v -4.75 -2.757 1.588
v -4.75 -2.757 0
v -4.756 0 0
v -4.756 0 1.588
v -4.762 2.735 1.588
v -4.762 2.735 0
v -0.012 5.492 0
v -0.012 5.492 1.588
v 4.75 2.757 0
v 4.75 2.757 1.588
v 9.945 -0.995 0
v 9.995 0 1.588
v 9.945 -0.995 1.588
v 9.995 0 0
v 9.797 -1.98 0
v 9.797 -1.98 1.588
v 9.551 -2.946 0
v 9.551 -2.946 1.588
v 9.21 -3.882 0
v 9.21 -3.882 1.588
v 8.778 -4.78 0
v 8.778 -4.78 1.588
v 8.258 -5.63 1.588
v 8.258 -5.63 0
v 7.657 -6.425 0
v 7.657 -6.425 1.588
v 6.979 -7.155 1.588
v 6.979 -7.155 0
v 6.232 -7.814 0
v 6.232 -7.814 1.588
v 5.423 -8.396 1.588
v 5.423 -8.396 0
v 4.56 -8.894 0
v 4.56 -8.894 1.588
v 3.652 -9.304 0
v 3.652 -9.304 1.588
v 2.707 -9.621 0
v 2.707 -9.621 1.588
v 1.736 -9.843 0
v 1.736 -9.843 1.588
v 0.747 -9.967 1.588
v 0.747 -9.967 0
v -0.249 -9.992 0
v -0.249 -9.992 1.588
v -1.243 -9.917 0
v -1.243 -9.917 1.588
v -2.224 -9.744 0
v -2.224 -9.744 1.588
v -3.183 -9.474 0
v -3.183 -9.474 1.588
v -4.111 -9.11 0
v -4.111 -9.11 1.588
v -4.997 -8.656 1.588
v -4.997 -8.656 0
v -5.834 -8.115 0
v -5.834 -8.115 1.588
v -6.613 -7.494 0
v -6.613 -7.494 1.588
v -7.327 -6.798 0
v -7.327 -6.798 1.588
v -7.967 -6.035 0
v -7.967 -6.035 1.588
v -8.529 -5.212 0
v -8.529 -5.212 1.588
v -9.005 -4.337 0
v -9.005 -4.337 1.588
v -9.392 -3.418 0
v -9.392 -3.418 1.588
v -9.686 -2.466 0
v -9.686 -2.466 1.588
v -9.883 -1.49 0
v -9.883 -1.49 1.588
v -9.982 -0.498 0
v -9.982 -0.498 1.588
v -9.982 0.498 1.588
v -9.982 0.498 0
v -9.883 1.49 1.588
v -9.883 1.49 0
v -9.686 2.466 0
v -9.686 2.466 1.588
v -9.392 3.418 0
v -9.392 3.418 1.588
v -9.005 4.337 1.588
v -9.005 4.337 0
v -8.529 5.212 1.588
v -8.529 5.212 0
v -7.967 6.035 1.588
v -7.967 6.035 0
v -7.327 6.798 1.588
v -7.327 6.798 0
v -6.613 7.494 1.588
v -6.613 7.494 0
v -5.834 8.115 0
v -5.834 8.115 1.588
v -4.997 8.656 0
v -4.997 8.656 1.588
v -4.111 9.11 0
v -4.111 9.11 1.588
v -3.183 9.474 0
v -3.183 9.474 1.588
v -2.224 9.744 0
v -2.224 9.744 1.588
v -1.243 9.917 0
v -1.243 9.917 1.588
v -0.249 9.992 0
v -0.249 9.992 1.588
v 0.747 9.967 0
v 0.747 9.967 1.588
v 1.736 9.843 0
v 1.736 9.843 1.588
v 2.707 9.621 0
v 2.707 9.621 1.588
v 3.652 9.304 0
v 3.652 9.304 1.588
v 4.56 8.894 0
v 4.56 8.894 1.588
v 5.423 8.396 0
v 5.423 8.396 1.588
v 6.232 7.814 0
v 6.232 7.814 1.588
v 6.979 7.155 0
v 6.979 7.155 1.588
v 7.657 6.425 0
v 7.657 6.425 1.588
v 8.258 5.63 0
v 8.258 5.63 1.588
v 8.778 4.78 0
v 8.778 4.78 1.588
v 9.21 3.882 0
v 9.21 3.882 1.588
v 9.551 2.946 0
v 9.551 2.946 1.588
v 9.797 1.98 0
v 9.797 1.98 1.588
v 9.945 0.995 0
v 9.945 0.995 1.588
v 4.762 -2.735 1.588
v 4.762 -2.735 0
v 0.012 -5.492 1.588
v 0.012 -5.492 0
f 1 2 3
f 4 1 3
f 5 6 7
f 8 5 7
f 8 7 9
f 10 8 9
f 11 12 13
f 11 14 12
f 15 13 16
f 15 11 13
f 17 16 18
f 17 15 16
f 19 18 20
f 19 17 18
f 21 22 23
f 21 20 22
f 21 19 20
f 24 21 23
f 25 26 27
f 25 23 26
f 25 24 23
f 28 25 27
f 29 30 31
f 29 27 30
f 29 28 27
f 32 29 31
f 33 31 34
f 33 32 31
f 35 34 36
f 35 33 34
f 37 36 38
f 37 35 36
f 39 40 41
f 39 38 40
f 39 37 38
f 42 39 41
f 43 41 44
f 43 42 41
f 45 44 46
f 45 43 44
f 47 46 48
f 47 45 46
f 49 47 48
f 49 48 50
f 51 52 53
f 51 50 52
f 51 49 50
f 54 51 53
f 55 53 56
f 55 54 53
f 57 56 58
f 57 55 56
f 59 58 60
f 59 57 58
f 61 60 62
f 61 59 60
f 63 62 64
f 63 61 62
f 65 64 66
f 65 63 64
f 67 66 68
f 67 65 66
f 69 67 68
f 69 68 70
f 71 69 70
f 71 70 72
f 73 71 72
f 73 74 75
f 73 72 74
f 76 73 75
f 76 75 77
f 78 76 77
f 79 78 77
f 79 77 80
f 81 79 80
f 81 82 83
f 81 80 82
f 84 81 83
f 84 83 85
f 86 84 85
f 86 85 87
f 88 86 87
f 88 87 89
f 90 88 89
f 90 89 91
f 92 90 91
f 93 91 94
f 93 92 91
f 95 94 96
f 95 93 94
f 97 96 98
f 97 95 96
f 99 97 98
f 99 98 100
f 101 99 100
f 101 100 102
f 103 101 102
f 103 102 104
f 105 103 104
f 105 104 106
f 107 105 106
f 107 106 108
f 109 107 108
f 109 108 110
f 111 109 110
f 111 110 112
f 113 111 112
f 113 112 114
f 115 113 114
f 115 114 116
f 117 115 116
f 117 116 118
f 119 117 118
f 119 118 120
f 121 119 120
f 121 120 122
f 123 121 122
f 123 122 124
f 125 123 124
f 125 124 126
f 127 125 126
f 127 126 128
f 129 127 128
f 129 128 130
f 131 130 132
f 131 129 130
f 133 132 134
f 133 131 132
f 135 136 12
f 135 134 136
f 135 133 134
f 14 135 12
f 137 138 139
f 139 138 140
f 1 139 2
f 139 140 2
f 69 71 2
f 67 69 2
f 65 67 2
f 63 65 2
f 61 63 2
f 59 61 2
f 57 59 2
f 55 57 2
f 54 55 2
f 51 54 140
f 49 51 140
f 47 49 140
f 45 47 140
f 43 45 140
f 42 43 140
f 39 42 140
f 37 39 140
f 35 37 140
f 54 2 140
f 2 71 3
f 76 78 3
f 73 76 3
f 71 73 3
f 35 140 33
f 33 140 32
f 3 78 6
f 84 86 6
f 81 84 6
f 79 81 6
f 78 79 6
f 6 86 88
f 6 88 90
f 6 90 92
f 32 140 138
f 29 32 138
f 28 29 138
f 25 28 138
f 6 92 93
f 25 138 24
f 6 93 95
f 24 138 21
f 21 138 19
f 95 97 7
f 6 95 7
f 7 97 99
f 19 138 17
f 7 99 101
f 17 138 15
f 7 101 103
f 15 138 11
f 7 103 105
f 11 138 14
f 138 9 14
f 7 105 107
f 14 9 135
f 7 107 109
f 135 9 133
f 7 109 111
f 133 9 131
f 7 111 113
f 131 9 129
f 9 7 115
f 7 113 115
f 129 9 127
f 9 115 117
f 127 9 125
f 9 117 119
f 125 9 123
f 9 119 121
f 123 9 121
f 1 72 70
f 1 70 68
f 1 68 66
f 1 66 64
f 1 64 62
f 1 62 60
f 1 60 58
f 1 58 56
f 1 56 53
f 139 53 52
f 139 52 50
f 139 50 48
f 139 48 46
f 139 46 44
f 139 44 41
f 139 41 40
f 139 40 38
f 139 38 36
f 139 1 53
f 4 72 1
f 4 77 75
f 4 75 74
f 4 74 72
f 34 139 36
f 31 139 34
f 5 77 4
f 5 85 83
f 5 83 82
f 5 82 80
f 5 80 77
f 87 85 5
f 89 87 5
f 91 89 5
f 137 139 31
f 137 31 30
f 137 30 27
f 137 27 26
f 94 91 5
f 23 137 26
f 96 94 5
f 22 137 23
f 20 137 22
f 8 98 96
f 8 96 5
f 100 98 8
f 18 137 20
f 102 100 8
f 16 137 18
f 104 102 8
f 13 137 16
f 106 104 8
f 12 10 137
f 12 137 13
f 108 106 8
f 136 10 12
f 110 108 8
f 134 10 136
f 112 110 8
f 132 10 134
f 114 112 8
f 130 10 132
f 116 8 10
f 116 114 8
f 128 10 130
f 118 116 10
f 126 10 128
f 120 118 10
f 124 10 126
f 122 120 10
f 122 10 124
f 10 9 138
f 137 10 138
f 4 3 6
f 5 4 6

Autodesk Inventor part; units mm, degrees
ref_plane "YZ Plane" through (0, 0, 0) normal (1, 0, 0) x (0, 1, 0)
ref_plane "XZ Plane" through (0, 0, 0) normal (0, 1, 0) x (-1, 0, 0)
ref_plane "XY Plane" through (0, 0, 0) normal (0, 0, 1) x (1, 0, 0)
sketch "Sketch1" plane through (0, 0, 0) normal (0, 0, 1) x (1, 0, 0)
  circle A0 centre (0, 0) radius 9.9949
  line L0 (0, 0) -> (-4.7625, 0)
  line L1 (-4.7625, 2.7354) -> (-0.0123, 5.4921)
  line L2 (-0.0123, 5.4921) -> (4.7502, 2.7568)
  line L3 (4.7502, 2.7568) -> (4.7625, -2.7354)
  line L4 (4.7625, -2.7354) -> (0.0123, -5.4921)
  line L5 (0.0123, -5.4921) -> (-4.7502, -2.7568)
  line L6 (-4.7502, -2.7568) -> (-4.7625, 2.7354)
  dimension "d1" = 19.9898
  dimension "d4" = 4.7625
extrude "Extrusion2" add sketch "Sketch1" along normal blind 1.5875
properties part number "Spacer 1 16 in"
